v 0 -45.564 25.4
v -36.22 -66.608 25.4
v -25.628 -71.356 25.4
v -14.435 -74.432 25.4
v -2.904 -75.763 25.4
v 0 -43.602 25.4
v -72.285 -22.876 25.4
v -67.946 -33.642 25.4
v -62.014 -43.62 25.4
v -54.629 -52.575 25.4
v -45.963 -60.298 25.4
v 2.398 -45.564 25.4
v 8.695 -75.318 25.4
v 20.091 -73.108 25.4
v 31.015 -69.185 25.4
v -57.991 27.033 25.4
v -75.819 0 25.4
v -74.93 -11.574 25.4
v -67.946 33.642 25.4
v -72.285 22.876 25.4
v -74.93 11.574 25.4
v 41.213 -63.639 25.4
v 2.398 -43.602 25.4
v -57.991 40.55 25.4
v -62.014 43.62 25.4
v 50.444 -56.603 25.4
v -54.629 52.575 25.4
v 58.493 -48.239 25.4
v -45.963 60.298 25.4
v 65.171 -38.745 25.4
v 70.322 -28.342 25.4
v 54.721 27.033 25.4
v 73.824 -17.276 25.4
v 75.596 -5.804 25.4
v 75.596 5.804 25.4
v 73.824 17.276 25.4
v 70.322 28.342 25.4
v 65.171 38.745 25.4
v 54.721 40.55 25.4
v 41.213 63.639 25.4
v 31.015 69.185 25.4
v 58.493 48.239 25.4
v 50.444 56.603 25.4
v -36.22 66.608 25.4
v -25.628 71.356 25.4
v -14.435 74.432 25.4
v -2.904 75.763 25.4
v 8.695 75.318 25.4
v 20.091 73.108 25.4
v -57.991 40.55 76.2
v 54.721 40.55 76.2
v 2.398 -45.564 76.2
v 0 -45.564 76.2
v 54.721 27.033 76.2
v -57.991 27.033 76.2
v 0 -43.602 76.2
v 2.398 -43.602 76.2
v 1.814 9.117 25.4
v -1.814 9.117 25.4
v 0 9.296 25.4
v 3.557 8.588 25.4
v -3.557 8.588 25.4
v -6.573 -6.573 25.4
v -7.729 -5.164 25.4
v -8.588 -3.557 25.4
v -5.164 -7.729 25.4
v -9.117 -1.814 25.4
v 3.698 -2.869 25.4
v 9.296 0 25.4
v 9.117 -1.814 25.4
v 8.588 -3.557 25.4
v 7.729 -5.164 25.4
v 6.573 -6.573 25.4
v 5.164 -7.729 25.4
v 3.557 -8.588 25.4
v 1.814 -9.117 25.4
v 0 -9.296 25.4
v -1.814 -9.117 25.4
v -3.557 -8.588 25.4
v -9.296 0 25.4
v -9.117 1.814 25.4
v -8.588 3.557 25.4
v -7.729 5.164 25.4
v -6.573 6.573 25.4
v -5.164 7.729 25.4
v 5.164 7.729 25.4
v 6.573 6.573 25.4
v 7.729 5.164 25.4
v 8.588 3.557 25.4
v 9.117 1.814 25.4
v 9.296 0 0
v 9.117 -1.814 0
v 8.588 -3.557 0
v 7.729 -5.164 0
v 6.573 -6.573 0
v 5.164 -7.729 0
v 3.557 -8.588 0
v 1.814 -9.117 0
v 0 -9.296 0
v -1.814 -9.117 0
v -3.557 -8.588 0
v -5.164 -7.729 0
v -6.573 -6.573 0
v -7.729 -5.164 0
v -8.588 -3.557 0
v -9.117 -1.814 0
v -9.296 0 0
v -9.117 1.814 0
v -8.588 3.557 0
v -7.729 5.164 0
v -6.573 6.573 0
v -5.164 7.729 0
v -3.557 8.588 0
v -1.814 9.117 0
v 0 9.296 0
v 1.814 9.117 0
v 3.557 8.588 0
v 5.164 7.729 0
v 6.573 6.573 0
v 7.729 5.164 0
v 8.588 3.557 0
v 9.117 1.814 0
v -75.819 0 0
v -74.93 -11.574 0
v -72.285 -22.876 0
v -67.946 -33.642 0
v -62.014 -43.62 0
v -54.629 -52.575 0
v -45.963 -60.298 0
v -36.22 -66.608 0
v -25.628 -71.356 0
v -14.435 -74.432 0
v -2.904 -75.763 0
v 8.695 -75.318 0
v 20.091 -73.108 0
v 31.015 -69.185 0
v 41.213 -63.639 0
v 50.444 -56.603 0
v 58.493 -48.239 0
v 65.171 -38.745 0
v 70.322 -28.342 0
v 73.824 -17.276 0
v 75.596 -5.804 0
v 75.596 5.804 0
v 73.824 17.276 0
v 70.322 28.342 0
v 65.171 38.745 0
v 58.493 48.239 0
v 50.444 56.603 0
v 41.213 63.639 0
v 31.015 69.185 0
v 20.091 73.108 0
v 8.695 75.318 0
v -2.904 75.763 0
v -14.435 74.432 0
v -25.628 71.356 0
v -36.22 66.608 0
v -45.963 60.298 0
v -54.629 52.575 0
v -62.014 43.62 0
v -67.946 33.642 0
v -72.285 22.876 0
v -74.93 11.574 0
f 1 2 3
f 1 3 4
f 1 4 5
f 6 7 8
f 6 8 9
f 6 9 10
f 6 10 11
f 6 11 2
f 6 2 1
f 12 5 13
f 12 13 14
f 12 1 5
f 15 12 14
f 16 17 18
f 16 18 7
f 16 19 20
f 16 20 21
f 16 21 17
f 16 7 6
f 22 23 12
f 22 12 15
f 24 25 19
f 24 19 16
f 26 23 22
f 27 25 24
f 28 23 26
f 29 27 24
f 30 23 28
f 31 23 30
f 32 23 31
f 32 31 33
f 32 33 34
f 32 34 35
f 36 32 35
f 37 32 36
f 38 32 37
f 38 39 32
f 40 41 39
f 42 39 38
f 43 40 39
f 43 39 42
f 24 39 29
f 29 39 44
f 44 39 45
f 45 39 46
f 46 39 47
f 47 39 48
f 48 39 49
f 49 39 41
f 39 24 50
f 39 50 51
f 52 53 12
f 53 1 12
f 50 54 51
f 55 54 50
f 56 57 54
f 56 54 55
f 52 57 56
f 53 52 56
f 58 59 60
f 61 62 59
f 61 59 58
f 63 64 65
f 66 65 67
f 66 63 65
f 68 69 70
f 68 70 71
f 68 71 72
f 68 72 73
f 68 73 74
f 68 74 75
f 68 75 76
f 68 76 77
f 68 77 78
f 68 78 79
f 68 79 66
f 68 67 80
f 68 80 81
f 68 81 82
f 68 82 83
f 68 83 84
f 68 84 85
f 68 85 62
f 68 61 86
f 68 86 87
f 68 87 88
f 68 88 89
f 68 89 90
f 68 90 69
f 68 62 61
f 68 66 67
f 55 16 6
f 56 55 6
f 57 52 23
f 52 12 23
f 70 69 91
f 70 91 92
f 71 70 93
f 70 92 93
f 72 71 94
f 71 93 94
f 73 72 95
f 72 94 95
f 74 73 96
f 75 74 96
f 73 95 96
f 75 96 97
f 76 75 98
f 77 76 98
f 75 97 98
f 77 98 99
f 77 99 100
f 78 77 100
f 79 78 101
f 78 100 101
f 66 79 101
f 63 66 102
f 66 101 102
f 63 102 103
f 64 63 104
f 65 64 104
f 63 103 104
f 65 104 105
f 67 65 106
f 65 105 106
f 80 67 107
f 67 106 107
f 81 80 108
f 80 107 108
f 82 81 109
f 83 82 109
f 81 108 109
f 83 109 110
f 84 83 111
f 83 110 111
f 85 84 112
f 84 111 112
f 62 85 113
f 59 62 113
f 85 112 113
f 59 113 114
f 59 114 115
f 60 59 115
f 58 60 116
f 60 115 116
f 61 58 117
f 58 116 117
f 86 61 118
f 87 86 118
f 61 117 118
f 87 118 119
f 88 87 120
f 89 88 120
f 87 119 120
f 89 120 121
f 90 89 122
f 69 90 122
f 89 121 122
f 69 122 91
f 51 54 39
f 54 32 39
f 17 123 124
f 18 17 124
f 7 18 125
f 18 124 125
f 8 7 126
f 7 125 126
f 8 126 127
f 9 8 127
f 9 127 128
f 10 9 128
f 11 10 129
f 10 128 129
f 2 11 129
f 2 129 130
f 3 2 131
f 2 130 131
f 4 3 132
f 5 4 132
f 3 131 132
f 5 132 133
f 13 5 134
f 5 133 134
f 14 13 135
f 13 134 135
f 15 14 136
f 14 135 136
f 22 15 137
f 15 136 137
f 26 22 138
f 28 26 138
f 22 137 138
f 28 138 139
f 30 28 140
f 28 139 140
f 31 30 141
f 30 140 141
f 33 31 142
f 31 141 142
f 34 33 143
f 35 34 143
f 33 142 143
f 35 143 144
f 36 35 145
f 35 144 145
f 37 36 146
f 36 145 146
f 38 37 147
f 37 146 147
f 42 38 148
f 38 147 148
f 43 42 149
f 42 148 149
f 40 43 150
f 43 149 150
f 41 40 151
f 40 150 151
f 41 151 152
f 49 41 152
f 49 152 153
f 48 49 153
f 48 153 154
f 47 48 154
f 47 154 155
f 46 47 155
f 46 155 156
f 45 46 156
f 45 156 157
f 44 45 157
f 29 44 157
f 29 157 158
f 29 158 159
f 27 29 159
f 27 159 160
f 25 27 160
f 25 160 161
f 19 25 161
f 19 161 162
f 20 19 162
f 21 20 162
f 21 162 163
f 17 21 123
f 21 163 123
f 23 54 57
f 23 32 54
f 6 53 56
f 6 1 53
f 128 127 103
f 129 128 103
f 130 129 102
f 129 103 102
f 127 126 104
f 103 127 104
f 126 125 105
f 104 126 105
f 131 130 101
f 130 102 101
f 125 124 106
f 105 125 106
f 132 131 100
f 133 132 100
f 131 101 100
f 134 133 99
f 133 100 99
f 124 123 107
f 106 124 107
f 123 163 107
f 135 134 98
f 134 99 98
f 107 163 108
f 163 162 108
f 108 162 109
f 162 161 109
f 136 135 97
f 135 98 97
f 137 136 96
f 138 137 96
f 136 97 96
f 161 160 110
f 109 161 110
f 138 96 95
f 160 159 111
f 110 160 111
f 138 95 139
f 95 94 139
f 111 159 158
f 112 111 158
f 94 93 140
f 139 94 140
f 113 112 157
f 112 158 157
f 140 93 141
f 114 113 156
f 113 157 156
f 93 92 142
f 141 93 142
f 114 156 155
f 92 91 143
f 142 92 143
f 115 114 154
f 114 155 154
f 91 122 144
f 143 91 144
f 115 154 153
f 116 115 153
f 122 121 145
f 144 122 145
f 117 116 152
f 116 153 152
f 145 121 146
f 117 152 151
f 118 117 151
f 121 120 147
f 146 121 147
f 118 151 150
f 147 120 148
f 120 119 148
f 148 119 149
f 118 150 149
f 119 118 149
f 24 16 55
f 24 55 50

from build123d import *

# Parameters (mm, degrees)
F1_DEPTH   = 25.4
F2_W       = 112.7116382122
F2_H       = 13.5166756809
F2_W_2     = 2.3981197737
F2_H_2     = 1.962095499
F3_DEPTH   = 25.4
F3_FACE_W  = 112.7116382122
F3_FACE_H  = 25.4
F3_FACE1_W = 2.3981197737
F3_FACE1_H = 25.4
F5_DEPTH   = 25.4


with BuildPart() as f1:
    # F0 (on Top) → F1 (new body)
    with BuildSketch(Plane.XY):
        with BuildLine():
            Line((9.2957576653, 0), (75.818580382, 0))
            ThreePointArc((75.818580382, 0), (0, 75.818580382), (-75.818580382, 0))
            Line((-75.818580382, 0), (-9.2957576653, 0))
            ThreePointArc((-9.2957576653, 0), (0, 9.2957576653), (9.2957576653, 0))
        make_face()
        with BuildLine():
            ThreePointArc((-75.818580382, 0), (0, -75.818580382), (75.818580382, 0))
            Line((75.818580382, 0), (9.2957576653, 0))
            ThreePointArc((9.2957576653, 0), (0, -9.2957576653), (-9.2957576653, 0))
            Line((-9.2957576653, 0), (-75.818580382, 0))
        make_face()
    extrude(amount=F1_DEPTH)

    # F2 (on face) → F3 (join)
    with BuildSketch(Plane.XY.offset(25.4)):
        with Locations((-1.6350820661, 33.7916892022)):
            Rectangle(F2_W, F2_H)
        with Locations((1.1990598869, -44.5832274854)):
            Rectangle(F2_W_2, F2_H_2)
    extrude(amount=F3_DEPTH)

    # F3_face (on face) → F4 section 0
    with BuildSketch(Plane(origin=(-1.6350820661, 27.0333513618, 38.1), x_dir=(1, 0, 0), z_dir=(0, -1, 0))):
        Rectangle(F3_FACE_W, F3_FACE_H)
    # F3_face1 (on face) → F4 section 1
    with BuildSketch(Plane(origin=(1.1990598869, -43.6021797359, 38.1), x_dir=(-1, 0, 0), z_dir=(0, 1, 0))):
        Rectangle(F3_FACE1_W, F3_FACE1_H)
    loft()

    # F5 (add): a face of the model
    f5_faces = [f1.faces().sort_by_distance(p)[0] for p in [
        (-0.9317783137, 11.344748031, 50.8),
    ]]
    extrude(f5_faces, amount=F5_DEPTH)


solid = f1.part
